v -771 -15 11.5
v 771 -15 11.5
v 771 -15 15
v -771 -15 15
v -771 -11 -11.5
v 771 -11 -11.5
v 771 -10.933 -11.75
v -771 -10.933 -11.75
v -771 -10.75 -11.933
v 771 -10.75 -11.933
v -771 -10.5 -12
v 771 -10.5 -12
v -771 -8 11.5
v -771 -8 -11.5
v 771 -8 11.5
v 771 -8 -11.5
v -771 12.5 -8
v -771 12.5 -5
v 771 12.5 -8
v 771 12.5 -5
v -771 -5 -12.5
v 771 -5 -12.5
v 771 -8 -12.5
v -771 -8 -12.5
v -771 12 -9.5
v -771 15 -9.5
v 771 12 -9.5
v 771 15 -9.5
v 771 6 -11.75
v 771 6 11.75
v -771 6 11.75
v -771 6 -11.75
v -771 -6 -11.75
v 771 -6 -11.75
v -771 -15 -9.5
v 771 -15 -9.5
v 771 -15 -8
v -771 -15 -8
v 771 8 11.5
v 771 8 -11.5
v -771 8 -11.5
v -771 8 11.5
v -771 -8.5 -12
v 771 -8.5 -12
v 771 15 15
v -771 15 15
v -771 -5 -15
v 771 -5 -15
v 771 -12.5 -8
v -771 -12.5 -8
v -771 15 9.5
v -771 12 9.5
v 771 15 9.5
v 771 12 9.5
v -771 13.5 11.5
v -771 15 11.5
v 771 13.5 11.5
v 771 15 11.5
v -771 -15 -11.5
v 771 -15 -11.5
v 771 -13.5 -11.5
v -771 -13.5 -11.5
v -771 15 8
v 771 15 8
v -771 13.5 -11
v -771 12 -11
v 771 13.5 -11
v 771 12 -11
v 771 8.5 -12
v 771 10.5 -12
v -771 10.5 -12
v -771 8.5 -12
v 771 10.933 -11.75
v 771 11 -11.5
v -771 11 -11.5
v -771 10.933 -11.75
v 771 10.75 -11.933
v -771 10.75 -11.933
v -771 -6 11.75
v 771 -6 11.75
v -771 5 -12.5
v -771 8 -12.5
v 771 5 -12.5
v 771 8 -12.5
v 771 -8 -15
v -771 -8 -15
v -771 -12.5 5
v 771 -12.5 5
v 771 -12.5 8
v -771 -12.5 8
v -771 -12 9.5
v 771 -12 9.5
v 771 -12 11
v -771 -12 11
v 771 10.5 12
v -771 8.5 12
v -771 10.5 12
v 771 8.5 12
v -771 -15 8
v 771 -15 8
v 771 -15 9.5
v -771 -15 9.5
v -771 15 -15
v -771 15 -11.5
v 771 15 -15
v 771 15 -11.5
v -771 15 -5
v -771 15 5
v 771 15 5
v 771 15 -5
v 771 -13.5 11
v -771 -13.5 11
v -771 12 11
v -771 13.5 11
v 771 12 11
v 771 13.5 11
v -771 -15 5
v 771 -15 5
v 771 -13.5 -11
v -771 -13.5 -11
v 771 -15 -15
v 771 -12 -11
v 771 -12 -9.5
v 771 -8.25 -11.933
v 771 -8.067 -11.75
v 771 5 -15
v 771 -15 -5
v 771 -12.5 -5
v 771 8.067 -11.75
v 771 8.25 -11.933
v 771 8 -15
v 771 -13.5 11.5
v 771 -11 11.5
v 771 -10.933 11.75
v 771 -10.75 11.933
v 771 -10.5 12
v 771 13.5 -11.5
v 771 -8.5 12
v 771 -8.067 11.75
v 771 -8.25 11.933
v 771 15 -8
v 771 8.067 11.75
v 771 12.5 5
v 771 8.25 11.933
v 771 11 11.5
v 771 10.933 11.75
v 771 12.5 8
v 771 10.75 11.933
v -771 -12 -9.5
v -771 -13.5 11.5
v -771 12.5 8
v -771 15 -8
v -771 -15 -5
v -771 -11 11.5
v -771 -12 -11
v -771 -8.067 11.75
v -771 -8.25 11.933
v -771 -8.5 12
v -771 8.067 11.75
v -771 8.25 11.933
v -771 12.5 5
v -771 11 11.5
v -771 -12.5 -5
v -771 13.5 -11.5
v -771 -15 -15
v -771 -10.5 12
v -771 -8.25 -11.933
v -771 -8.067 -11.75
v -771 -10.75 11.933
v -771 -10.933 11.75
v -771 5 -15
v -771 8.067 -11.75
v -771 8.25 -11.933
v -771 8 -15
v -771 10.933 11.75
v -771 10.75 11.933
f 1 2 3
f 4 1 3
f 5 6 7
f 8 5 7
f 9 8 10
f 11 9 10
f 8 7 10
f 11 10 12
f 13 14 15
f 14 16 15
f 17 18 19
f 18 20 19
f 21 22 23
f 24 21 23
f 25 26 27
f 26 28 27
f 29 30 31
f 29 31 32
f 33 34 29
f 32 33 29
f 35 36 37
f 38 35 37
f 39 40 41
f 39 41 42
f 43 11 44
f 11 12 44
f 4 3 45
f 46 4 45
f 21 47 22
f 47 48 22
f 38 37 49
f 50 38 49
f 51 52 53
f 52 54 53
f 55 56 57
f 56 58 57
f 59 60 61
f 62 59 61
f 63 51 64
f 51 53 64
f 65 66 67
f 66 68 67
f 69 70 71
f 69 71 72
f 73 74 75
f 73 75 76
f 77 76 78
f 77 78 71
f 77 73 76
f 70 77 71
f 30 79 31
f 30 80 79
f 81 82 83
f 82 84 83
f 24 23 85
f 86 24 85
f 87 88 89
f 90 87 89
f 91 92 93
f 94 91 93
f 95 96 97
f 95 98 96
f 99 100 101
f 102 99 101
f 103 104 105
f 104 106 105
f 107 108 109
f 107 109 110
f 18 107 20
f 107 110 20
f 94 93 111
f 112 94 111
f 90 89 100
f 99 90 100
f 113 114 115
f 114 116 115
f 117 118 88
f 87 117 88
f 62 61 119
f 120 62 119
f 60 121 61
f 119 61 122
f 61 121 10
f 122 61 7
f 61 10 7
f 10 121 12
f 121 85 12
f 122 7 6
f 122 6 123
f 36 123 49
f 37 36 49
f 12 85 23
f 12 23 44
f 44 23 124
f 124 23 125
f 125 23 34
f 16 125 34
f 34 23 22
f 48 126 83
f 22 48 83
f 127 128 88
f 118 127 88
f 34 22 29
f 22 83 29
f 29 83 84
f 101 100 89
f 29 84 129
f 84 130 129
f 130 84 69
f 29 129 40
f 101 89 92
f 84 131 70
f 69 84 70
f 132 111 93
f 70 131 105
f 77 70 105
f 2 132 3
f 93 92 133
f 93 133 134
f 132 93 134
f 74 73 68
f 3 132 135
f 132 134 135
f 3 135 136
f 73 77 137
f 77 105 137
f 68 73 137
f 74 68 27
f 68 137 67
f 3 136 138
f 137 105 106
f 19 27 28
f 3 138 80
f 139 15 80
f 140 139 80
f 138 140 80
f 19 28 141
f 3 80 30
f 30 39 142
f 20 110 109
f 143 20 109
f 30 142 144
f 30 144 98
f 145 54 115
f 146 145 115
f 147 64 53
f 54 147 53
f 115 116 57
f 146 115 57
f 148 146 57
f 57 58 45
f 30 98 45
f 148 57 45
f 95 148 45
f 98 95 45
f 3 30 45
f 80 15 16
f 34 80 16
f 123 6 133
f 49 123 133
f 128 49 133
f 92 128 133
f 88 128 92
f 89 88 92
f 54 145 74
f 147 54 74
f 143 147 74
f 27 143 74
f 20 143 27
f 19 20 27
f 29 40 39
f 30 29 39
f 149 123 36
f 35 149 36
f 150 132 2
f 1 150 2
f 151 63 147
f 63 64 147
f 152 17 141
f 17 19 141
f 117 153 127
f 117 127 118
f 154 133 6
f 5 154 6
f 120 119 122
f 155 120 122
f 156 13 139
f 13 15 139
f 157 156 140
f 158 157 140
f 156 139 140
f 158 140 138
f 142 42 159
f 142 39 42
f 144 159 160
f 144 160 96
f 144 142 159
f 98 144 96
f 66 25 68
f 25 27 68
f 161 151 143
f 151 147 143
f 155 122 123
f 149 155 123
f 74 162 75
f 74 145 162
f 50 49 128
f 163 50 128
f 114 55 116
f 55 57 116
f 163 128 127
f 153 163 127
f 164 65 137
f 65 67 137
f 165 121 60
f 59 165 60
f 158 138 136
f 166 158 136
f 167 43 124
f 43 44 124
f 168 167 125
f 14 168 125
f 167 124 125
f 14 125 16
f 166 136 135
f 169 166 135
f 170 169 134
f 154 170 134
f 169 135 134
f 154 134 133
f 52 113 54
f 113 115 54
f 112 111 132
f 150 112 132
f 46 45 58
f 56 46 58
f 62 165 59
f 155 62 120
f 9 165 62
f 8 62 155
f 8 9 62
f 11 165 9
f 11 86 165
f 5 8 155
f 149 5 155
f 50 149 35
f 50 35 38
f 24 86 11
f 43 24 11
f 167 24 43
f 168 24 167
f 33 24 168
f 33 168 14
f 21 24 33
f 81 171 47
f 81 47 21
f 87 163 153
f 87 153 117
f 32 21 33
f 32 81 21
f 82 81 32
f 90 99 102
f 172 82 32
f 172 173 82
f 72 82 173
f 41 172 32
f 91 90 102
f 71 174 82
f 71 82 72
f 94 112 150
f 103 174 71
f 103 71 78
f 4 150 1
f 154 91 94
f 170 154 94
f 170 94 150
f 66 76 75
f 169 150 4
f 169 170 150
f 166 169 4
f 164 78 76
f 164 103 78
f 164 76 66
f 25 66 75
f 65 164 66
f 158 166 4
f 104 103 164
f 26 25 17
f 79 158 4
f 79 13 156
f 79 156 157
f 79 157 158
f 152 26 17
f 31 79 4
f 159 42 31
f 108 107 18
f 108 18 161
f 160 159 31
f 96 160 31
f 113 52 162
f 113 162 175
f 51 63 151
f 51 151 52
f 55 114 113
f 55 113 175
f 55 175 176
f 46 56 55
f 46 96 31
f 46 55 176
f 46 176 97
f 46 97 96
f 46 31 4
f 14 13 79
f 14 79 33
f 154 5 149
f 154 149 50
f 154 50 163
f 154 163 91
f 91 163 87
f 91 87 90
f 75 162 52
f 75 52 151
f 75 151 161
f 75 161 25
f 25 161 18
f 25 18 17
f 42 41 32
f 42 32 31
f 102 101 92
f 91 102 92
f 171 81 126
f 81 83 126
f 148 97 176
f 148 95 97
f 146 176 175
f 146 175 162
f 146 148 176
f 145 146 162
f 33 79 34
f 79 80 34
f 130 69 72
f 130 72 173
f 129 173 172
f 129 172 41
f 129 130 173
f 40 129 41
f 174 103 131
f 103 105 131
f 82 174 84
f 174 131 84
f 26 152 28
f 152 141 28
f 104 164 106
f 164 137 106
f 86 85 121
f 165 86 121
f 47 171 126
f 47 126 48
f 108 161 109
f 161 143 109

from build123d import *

# Parameters (mm, degrees)
SKETCH_1_W      = 23.5
SKETCH_1_H      = 12
EXTRUDE_1_DEPTH = 771


with BuildPart() as part:
    # 草图1 → 凸台-拉伸1 (new, symmetric)
    with BuildSketch(Plane(origin=(0, 0, 0), x_dir=(0, 0, -1), z_dir=(1, 0, 0))):
        Polygon((-15, 15), (-11.5, 15), (-11.5, 13.5), (-11, 13.5), (-11, 12), (-9.5, 12), (-9.5, 15), (-8, 15), (-8, 12.5), (-5, 12.5), (-5, 15), (5, 15), (5, 12.5), (8, 12.5), (8, 15), (9.5, 15), (9.5, 12), (11, 12), (11, 13.5), (11.5, 13.5), (11.5, 15), (15, 15), (15, 8), (12.5, 8), (12.5, 5), (15, 5), (15, -5), (12.5, -5), (12.5, -8), (15, -8), (15, -15), (11.5, -15), (11.5, -13.5), (11, -13.5), (11, -12), (9.5, -12), (9.5, -15), (8, -15), (8, -12.5), (5, -12.5), (5, -15), (-5, -15), (-5, -12.5), (-8, -12.5), (-8, -15), (-9.5, -15), (-9.5, -12), (-11, -12), (-11, -13.5), (-11.5, -13.5), (-11.5, -15), (-15, -15), align=None)
        with BuildLine():
            Line((12, -10.5), (12, -8.5))
            ThreePointArc((12, -8.5), (11.853553391, -8.146446609), (11.5, -8))
            Line((11.5, -8), (-11.5, -8))
            ThreePointArc((-11.5, -8), (-11.853553391, -8.146446609), (-12, -8.5))
            Line((-12, -8.5), (-12, -10.5))
            ThreePointArc((-12, -10.5), (-11.853553391, -10.853553391), (-11.5, -11))
            Line((-11.5, -11), (11.5, -11))
            ThreePointArc((11.5, -11), (11.853553391, -10.853553391), (12, -10.5))
        make_face(mode=Mode.SUBTRACT)
        with BuildLine():
            Line((-11.5, 11), (11.5, 11))
            ThreePointArc((11.5, 11), (11.853553391, 10.853553391), (12, 10.5))
            Line((12, 10.5), (12, 8.5))
            ThreePointArc((12, 8.5), (11.853553391, 8.146446609), (11.5, 8))
            Line((11.5, 8), (-11.5, 8))
            ThreePointArc((-11.5, 8), (-11.853553391, 8.146446609), (-12, 8.5))
            Line((-12, 8.5), (-12, 10.5))
            ThreePointArc((-12, 10.5), (-11.853553391, 10.853553391), (-11.5, 11))
        make_face(mode=Mode.SUBTRACT)
        Rectangle(SKETCH_1_W, SKETCH_1_H, mode=Mode.SUBTRACT)
    extrude(amount=EXTRUDE_1_DEPTH, both=True)


solid = part.part
